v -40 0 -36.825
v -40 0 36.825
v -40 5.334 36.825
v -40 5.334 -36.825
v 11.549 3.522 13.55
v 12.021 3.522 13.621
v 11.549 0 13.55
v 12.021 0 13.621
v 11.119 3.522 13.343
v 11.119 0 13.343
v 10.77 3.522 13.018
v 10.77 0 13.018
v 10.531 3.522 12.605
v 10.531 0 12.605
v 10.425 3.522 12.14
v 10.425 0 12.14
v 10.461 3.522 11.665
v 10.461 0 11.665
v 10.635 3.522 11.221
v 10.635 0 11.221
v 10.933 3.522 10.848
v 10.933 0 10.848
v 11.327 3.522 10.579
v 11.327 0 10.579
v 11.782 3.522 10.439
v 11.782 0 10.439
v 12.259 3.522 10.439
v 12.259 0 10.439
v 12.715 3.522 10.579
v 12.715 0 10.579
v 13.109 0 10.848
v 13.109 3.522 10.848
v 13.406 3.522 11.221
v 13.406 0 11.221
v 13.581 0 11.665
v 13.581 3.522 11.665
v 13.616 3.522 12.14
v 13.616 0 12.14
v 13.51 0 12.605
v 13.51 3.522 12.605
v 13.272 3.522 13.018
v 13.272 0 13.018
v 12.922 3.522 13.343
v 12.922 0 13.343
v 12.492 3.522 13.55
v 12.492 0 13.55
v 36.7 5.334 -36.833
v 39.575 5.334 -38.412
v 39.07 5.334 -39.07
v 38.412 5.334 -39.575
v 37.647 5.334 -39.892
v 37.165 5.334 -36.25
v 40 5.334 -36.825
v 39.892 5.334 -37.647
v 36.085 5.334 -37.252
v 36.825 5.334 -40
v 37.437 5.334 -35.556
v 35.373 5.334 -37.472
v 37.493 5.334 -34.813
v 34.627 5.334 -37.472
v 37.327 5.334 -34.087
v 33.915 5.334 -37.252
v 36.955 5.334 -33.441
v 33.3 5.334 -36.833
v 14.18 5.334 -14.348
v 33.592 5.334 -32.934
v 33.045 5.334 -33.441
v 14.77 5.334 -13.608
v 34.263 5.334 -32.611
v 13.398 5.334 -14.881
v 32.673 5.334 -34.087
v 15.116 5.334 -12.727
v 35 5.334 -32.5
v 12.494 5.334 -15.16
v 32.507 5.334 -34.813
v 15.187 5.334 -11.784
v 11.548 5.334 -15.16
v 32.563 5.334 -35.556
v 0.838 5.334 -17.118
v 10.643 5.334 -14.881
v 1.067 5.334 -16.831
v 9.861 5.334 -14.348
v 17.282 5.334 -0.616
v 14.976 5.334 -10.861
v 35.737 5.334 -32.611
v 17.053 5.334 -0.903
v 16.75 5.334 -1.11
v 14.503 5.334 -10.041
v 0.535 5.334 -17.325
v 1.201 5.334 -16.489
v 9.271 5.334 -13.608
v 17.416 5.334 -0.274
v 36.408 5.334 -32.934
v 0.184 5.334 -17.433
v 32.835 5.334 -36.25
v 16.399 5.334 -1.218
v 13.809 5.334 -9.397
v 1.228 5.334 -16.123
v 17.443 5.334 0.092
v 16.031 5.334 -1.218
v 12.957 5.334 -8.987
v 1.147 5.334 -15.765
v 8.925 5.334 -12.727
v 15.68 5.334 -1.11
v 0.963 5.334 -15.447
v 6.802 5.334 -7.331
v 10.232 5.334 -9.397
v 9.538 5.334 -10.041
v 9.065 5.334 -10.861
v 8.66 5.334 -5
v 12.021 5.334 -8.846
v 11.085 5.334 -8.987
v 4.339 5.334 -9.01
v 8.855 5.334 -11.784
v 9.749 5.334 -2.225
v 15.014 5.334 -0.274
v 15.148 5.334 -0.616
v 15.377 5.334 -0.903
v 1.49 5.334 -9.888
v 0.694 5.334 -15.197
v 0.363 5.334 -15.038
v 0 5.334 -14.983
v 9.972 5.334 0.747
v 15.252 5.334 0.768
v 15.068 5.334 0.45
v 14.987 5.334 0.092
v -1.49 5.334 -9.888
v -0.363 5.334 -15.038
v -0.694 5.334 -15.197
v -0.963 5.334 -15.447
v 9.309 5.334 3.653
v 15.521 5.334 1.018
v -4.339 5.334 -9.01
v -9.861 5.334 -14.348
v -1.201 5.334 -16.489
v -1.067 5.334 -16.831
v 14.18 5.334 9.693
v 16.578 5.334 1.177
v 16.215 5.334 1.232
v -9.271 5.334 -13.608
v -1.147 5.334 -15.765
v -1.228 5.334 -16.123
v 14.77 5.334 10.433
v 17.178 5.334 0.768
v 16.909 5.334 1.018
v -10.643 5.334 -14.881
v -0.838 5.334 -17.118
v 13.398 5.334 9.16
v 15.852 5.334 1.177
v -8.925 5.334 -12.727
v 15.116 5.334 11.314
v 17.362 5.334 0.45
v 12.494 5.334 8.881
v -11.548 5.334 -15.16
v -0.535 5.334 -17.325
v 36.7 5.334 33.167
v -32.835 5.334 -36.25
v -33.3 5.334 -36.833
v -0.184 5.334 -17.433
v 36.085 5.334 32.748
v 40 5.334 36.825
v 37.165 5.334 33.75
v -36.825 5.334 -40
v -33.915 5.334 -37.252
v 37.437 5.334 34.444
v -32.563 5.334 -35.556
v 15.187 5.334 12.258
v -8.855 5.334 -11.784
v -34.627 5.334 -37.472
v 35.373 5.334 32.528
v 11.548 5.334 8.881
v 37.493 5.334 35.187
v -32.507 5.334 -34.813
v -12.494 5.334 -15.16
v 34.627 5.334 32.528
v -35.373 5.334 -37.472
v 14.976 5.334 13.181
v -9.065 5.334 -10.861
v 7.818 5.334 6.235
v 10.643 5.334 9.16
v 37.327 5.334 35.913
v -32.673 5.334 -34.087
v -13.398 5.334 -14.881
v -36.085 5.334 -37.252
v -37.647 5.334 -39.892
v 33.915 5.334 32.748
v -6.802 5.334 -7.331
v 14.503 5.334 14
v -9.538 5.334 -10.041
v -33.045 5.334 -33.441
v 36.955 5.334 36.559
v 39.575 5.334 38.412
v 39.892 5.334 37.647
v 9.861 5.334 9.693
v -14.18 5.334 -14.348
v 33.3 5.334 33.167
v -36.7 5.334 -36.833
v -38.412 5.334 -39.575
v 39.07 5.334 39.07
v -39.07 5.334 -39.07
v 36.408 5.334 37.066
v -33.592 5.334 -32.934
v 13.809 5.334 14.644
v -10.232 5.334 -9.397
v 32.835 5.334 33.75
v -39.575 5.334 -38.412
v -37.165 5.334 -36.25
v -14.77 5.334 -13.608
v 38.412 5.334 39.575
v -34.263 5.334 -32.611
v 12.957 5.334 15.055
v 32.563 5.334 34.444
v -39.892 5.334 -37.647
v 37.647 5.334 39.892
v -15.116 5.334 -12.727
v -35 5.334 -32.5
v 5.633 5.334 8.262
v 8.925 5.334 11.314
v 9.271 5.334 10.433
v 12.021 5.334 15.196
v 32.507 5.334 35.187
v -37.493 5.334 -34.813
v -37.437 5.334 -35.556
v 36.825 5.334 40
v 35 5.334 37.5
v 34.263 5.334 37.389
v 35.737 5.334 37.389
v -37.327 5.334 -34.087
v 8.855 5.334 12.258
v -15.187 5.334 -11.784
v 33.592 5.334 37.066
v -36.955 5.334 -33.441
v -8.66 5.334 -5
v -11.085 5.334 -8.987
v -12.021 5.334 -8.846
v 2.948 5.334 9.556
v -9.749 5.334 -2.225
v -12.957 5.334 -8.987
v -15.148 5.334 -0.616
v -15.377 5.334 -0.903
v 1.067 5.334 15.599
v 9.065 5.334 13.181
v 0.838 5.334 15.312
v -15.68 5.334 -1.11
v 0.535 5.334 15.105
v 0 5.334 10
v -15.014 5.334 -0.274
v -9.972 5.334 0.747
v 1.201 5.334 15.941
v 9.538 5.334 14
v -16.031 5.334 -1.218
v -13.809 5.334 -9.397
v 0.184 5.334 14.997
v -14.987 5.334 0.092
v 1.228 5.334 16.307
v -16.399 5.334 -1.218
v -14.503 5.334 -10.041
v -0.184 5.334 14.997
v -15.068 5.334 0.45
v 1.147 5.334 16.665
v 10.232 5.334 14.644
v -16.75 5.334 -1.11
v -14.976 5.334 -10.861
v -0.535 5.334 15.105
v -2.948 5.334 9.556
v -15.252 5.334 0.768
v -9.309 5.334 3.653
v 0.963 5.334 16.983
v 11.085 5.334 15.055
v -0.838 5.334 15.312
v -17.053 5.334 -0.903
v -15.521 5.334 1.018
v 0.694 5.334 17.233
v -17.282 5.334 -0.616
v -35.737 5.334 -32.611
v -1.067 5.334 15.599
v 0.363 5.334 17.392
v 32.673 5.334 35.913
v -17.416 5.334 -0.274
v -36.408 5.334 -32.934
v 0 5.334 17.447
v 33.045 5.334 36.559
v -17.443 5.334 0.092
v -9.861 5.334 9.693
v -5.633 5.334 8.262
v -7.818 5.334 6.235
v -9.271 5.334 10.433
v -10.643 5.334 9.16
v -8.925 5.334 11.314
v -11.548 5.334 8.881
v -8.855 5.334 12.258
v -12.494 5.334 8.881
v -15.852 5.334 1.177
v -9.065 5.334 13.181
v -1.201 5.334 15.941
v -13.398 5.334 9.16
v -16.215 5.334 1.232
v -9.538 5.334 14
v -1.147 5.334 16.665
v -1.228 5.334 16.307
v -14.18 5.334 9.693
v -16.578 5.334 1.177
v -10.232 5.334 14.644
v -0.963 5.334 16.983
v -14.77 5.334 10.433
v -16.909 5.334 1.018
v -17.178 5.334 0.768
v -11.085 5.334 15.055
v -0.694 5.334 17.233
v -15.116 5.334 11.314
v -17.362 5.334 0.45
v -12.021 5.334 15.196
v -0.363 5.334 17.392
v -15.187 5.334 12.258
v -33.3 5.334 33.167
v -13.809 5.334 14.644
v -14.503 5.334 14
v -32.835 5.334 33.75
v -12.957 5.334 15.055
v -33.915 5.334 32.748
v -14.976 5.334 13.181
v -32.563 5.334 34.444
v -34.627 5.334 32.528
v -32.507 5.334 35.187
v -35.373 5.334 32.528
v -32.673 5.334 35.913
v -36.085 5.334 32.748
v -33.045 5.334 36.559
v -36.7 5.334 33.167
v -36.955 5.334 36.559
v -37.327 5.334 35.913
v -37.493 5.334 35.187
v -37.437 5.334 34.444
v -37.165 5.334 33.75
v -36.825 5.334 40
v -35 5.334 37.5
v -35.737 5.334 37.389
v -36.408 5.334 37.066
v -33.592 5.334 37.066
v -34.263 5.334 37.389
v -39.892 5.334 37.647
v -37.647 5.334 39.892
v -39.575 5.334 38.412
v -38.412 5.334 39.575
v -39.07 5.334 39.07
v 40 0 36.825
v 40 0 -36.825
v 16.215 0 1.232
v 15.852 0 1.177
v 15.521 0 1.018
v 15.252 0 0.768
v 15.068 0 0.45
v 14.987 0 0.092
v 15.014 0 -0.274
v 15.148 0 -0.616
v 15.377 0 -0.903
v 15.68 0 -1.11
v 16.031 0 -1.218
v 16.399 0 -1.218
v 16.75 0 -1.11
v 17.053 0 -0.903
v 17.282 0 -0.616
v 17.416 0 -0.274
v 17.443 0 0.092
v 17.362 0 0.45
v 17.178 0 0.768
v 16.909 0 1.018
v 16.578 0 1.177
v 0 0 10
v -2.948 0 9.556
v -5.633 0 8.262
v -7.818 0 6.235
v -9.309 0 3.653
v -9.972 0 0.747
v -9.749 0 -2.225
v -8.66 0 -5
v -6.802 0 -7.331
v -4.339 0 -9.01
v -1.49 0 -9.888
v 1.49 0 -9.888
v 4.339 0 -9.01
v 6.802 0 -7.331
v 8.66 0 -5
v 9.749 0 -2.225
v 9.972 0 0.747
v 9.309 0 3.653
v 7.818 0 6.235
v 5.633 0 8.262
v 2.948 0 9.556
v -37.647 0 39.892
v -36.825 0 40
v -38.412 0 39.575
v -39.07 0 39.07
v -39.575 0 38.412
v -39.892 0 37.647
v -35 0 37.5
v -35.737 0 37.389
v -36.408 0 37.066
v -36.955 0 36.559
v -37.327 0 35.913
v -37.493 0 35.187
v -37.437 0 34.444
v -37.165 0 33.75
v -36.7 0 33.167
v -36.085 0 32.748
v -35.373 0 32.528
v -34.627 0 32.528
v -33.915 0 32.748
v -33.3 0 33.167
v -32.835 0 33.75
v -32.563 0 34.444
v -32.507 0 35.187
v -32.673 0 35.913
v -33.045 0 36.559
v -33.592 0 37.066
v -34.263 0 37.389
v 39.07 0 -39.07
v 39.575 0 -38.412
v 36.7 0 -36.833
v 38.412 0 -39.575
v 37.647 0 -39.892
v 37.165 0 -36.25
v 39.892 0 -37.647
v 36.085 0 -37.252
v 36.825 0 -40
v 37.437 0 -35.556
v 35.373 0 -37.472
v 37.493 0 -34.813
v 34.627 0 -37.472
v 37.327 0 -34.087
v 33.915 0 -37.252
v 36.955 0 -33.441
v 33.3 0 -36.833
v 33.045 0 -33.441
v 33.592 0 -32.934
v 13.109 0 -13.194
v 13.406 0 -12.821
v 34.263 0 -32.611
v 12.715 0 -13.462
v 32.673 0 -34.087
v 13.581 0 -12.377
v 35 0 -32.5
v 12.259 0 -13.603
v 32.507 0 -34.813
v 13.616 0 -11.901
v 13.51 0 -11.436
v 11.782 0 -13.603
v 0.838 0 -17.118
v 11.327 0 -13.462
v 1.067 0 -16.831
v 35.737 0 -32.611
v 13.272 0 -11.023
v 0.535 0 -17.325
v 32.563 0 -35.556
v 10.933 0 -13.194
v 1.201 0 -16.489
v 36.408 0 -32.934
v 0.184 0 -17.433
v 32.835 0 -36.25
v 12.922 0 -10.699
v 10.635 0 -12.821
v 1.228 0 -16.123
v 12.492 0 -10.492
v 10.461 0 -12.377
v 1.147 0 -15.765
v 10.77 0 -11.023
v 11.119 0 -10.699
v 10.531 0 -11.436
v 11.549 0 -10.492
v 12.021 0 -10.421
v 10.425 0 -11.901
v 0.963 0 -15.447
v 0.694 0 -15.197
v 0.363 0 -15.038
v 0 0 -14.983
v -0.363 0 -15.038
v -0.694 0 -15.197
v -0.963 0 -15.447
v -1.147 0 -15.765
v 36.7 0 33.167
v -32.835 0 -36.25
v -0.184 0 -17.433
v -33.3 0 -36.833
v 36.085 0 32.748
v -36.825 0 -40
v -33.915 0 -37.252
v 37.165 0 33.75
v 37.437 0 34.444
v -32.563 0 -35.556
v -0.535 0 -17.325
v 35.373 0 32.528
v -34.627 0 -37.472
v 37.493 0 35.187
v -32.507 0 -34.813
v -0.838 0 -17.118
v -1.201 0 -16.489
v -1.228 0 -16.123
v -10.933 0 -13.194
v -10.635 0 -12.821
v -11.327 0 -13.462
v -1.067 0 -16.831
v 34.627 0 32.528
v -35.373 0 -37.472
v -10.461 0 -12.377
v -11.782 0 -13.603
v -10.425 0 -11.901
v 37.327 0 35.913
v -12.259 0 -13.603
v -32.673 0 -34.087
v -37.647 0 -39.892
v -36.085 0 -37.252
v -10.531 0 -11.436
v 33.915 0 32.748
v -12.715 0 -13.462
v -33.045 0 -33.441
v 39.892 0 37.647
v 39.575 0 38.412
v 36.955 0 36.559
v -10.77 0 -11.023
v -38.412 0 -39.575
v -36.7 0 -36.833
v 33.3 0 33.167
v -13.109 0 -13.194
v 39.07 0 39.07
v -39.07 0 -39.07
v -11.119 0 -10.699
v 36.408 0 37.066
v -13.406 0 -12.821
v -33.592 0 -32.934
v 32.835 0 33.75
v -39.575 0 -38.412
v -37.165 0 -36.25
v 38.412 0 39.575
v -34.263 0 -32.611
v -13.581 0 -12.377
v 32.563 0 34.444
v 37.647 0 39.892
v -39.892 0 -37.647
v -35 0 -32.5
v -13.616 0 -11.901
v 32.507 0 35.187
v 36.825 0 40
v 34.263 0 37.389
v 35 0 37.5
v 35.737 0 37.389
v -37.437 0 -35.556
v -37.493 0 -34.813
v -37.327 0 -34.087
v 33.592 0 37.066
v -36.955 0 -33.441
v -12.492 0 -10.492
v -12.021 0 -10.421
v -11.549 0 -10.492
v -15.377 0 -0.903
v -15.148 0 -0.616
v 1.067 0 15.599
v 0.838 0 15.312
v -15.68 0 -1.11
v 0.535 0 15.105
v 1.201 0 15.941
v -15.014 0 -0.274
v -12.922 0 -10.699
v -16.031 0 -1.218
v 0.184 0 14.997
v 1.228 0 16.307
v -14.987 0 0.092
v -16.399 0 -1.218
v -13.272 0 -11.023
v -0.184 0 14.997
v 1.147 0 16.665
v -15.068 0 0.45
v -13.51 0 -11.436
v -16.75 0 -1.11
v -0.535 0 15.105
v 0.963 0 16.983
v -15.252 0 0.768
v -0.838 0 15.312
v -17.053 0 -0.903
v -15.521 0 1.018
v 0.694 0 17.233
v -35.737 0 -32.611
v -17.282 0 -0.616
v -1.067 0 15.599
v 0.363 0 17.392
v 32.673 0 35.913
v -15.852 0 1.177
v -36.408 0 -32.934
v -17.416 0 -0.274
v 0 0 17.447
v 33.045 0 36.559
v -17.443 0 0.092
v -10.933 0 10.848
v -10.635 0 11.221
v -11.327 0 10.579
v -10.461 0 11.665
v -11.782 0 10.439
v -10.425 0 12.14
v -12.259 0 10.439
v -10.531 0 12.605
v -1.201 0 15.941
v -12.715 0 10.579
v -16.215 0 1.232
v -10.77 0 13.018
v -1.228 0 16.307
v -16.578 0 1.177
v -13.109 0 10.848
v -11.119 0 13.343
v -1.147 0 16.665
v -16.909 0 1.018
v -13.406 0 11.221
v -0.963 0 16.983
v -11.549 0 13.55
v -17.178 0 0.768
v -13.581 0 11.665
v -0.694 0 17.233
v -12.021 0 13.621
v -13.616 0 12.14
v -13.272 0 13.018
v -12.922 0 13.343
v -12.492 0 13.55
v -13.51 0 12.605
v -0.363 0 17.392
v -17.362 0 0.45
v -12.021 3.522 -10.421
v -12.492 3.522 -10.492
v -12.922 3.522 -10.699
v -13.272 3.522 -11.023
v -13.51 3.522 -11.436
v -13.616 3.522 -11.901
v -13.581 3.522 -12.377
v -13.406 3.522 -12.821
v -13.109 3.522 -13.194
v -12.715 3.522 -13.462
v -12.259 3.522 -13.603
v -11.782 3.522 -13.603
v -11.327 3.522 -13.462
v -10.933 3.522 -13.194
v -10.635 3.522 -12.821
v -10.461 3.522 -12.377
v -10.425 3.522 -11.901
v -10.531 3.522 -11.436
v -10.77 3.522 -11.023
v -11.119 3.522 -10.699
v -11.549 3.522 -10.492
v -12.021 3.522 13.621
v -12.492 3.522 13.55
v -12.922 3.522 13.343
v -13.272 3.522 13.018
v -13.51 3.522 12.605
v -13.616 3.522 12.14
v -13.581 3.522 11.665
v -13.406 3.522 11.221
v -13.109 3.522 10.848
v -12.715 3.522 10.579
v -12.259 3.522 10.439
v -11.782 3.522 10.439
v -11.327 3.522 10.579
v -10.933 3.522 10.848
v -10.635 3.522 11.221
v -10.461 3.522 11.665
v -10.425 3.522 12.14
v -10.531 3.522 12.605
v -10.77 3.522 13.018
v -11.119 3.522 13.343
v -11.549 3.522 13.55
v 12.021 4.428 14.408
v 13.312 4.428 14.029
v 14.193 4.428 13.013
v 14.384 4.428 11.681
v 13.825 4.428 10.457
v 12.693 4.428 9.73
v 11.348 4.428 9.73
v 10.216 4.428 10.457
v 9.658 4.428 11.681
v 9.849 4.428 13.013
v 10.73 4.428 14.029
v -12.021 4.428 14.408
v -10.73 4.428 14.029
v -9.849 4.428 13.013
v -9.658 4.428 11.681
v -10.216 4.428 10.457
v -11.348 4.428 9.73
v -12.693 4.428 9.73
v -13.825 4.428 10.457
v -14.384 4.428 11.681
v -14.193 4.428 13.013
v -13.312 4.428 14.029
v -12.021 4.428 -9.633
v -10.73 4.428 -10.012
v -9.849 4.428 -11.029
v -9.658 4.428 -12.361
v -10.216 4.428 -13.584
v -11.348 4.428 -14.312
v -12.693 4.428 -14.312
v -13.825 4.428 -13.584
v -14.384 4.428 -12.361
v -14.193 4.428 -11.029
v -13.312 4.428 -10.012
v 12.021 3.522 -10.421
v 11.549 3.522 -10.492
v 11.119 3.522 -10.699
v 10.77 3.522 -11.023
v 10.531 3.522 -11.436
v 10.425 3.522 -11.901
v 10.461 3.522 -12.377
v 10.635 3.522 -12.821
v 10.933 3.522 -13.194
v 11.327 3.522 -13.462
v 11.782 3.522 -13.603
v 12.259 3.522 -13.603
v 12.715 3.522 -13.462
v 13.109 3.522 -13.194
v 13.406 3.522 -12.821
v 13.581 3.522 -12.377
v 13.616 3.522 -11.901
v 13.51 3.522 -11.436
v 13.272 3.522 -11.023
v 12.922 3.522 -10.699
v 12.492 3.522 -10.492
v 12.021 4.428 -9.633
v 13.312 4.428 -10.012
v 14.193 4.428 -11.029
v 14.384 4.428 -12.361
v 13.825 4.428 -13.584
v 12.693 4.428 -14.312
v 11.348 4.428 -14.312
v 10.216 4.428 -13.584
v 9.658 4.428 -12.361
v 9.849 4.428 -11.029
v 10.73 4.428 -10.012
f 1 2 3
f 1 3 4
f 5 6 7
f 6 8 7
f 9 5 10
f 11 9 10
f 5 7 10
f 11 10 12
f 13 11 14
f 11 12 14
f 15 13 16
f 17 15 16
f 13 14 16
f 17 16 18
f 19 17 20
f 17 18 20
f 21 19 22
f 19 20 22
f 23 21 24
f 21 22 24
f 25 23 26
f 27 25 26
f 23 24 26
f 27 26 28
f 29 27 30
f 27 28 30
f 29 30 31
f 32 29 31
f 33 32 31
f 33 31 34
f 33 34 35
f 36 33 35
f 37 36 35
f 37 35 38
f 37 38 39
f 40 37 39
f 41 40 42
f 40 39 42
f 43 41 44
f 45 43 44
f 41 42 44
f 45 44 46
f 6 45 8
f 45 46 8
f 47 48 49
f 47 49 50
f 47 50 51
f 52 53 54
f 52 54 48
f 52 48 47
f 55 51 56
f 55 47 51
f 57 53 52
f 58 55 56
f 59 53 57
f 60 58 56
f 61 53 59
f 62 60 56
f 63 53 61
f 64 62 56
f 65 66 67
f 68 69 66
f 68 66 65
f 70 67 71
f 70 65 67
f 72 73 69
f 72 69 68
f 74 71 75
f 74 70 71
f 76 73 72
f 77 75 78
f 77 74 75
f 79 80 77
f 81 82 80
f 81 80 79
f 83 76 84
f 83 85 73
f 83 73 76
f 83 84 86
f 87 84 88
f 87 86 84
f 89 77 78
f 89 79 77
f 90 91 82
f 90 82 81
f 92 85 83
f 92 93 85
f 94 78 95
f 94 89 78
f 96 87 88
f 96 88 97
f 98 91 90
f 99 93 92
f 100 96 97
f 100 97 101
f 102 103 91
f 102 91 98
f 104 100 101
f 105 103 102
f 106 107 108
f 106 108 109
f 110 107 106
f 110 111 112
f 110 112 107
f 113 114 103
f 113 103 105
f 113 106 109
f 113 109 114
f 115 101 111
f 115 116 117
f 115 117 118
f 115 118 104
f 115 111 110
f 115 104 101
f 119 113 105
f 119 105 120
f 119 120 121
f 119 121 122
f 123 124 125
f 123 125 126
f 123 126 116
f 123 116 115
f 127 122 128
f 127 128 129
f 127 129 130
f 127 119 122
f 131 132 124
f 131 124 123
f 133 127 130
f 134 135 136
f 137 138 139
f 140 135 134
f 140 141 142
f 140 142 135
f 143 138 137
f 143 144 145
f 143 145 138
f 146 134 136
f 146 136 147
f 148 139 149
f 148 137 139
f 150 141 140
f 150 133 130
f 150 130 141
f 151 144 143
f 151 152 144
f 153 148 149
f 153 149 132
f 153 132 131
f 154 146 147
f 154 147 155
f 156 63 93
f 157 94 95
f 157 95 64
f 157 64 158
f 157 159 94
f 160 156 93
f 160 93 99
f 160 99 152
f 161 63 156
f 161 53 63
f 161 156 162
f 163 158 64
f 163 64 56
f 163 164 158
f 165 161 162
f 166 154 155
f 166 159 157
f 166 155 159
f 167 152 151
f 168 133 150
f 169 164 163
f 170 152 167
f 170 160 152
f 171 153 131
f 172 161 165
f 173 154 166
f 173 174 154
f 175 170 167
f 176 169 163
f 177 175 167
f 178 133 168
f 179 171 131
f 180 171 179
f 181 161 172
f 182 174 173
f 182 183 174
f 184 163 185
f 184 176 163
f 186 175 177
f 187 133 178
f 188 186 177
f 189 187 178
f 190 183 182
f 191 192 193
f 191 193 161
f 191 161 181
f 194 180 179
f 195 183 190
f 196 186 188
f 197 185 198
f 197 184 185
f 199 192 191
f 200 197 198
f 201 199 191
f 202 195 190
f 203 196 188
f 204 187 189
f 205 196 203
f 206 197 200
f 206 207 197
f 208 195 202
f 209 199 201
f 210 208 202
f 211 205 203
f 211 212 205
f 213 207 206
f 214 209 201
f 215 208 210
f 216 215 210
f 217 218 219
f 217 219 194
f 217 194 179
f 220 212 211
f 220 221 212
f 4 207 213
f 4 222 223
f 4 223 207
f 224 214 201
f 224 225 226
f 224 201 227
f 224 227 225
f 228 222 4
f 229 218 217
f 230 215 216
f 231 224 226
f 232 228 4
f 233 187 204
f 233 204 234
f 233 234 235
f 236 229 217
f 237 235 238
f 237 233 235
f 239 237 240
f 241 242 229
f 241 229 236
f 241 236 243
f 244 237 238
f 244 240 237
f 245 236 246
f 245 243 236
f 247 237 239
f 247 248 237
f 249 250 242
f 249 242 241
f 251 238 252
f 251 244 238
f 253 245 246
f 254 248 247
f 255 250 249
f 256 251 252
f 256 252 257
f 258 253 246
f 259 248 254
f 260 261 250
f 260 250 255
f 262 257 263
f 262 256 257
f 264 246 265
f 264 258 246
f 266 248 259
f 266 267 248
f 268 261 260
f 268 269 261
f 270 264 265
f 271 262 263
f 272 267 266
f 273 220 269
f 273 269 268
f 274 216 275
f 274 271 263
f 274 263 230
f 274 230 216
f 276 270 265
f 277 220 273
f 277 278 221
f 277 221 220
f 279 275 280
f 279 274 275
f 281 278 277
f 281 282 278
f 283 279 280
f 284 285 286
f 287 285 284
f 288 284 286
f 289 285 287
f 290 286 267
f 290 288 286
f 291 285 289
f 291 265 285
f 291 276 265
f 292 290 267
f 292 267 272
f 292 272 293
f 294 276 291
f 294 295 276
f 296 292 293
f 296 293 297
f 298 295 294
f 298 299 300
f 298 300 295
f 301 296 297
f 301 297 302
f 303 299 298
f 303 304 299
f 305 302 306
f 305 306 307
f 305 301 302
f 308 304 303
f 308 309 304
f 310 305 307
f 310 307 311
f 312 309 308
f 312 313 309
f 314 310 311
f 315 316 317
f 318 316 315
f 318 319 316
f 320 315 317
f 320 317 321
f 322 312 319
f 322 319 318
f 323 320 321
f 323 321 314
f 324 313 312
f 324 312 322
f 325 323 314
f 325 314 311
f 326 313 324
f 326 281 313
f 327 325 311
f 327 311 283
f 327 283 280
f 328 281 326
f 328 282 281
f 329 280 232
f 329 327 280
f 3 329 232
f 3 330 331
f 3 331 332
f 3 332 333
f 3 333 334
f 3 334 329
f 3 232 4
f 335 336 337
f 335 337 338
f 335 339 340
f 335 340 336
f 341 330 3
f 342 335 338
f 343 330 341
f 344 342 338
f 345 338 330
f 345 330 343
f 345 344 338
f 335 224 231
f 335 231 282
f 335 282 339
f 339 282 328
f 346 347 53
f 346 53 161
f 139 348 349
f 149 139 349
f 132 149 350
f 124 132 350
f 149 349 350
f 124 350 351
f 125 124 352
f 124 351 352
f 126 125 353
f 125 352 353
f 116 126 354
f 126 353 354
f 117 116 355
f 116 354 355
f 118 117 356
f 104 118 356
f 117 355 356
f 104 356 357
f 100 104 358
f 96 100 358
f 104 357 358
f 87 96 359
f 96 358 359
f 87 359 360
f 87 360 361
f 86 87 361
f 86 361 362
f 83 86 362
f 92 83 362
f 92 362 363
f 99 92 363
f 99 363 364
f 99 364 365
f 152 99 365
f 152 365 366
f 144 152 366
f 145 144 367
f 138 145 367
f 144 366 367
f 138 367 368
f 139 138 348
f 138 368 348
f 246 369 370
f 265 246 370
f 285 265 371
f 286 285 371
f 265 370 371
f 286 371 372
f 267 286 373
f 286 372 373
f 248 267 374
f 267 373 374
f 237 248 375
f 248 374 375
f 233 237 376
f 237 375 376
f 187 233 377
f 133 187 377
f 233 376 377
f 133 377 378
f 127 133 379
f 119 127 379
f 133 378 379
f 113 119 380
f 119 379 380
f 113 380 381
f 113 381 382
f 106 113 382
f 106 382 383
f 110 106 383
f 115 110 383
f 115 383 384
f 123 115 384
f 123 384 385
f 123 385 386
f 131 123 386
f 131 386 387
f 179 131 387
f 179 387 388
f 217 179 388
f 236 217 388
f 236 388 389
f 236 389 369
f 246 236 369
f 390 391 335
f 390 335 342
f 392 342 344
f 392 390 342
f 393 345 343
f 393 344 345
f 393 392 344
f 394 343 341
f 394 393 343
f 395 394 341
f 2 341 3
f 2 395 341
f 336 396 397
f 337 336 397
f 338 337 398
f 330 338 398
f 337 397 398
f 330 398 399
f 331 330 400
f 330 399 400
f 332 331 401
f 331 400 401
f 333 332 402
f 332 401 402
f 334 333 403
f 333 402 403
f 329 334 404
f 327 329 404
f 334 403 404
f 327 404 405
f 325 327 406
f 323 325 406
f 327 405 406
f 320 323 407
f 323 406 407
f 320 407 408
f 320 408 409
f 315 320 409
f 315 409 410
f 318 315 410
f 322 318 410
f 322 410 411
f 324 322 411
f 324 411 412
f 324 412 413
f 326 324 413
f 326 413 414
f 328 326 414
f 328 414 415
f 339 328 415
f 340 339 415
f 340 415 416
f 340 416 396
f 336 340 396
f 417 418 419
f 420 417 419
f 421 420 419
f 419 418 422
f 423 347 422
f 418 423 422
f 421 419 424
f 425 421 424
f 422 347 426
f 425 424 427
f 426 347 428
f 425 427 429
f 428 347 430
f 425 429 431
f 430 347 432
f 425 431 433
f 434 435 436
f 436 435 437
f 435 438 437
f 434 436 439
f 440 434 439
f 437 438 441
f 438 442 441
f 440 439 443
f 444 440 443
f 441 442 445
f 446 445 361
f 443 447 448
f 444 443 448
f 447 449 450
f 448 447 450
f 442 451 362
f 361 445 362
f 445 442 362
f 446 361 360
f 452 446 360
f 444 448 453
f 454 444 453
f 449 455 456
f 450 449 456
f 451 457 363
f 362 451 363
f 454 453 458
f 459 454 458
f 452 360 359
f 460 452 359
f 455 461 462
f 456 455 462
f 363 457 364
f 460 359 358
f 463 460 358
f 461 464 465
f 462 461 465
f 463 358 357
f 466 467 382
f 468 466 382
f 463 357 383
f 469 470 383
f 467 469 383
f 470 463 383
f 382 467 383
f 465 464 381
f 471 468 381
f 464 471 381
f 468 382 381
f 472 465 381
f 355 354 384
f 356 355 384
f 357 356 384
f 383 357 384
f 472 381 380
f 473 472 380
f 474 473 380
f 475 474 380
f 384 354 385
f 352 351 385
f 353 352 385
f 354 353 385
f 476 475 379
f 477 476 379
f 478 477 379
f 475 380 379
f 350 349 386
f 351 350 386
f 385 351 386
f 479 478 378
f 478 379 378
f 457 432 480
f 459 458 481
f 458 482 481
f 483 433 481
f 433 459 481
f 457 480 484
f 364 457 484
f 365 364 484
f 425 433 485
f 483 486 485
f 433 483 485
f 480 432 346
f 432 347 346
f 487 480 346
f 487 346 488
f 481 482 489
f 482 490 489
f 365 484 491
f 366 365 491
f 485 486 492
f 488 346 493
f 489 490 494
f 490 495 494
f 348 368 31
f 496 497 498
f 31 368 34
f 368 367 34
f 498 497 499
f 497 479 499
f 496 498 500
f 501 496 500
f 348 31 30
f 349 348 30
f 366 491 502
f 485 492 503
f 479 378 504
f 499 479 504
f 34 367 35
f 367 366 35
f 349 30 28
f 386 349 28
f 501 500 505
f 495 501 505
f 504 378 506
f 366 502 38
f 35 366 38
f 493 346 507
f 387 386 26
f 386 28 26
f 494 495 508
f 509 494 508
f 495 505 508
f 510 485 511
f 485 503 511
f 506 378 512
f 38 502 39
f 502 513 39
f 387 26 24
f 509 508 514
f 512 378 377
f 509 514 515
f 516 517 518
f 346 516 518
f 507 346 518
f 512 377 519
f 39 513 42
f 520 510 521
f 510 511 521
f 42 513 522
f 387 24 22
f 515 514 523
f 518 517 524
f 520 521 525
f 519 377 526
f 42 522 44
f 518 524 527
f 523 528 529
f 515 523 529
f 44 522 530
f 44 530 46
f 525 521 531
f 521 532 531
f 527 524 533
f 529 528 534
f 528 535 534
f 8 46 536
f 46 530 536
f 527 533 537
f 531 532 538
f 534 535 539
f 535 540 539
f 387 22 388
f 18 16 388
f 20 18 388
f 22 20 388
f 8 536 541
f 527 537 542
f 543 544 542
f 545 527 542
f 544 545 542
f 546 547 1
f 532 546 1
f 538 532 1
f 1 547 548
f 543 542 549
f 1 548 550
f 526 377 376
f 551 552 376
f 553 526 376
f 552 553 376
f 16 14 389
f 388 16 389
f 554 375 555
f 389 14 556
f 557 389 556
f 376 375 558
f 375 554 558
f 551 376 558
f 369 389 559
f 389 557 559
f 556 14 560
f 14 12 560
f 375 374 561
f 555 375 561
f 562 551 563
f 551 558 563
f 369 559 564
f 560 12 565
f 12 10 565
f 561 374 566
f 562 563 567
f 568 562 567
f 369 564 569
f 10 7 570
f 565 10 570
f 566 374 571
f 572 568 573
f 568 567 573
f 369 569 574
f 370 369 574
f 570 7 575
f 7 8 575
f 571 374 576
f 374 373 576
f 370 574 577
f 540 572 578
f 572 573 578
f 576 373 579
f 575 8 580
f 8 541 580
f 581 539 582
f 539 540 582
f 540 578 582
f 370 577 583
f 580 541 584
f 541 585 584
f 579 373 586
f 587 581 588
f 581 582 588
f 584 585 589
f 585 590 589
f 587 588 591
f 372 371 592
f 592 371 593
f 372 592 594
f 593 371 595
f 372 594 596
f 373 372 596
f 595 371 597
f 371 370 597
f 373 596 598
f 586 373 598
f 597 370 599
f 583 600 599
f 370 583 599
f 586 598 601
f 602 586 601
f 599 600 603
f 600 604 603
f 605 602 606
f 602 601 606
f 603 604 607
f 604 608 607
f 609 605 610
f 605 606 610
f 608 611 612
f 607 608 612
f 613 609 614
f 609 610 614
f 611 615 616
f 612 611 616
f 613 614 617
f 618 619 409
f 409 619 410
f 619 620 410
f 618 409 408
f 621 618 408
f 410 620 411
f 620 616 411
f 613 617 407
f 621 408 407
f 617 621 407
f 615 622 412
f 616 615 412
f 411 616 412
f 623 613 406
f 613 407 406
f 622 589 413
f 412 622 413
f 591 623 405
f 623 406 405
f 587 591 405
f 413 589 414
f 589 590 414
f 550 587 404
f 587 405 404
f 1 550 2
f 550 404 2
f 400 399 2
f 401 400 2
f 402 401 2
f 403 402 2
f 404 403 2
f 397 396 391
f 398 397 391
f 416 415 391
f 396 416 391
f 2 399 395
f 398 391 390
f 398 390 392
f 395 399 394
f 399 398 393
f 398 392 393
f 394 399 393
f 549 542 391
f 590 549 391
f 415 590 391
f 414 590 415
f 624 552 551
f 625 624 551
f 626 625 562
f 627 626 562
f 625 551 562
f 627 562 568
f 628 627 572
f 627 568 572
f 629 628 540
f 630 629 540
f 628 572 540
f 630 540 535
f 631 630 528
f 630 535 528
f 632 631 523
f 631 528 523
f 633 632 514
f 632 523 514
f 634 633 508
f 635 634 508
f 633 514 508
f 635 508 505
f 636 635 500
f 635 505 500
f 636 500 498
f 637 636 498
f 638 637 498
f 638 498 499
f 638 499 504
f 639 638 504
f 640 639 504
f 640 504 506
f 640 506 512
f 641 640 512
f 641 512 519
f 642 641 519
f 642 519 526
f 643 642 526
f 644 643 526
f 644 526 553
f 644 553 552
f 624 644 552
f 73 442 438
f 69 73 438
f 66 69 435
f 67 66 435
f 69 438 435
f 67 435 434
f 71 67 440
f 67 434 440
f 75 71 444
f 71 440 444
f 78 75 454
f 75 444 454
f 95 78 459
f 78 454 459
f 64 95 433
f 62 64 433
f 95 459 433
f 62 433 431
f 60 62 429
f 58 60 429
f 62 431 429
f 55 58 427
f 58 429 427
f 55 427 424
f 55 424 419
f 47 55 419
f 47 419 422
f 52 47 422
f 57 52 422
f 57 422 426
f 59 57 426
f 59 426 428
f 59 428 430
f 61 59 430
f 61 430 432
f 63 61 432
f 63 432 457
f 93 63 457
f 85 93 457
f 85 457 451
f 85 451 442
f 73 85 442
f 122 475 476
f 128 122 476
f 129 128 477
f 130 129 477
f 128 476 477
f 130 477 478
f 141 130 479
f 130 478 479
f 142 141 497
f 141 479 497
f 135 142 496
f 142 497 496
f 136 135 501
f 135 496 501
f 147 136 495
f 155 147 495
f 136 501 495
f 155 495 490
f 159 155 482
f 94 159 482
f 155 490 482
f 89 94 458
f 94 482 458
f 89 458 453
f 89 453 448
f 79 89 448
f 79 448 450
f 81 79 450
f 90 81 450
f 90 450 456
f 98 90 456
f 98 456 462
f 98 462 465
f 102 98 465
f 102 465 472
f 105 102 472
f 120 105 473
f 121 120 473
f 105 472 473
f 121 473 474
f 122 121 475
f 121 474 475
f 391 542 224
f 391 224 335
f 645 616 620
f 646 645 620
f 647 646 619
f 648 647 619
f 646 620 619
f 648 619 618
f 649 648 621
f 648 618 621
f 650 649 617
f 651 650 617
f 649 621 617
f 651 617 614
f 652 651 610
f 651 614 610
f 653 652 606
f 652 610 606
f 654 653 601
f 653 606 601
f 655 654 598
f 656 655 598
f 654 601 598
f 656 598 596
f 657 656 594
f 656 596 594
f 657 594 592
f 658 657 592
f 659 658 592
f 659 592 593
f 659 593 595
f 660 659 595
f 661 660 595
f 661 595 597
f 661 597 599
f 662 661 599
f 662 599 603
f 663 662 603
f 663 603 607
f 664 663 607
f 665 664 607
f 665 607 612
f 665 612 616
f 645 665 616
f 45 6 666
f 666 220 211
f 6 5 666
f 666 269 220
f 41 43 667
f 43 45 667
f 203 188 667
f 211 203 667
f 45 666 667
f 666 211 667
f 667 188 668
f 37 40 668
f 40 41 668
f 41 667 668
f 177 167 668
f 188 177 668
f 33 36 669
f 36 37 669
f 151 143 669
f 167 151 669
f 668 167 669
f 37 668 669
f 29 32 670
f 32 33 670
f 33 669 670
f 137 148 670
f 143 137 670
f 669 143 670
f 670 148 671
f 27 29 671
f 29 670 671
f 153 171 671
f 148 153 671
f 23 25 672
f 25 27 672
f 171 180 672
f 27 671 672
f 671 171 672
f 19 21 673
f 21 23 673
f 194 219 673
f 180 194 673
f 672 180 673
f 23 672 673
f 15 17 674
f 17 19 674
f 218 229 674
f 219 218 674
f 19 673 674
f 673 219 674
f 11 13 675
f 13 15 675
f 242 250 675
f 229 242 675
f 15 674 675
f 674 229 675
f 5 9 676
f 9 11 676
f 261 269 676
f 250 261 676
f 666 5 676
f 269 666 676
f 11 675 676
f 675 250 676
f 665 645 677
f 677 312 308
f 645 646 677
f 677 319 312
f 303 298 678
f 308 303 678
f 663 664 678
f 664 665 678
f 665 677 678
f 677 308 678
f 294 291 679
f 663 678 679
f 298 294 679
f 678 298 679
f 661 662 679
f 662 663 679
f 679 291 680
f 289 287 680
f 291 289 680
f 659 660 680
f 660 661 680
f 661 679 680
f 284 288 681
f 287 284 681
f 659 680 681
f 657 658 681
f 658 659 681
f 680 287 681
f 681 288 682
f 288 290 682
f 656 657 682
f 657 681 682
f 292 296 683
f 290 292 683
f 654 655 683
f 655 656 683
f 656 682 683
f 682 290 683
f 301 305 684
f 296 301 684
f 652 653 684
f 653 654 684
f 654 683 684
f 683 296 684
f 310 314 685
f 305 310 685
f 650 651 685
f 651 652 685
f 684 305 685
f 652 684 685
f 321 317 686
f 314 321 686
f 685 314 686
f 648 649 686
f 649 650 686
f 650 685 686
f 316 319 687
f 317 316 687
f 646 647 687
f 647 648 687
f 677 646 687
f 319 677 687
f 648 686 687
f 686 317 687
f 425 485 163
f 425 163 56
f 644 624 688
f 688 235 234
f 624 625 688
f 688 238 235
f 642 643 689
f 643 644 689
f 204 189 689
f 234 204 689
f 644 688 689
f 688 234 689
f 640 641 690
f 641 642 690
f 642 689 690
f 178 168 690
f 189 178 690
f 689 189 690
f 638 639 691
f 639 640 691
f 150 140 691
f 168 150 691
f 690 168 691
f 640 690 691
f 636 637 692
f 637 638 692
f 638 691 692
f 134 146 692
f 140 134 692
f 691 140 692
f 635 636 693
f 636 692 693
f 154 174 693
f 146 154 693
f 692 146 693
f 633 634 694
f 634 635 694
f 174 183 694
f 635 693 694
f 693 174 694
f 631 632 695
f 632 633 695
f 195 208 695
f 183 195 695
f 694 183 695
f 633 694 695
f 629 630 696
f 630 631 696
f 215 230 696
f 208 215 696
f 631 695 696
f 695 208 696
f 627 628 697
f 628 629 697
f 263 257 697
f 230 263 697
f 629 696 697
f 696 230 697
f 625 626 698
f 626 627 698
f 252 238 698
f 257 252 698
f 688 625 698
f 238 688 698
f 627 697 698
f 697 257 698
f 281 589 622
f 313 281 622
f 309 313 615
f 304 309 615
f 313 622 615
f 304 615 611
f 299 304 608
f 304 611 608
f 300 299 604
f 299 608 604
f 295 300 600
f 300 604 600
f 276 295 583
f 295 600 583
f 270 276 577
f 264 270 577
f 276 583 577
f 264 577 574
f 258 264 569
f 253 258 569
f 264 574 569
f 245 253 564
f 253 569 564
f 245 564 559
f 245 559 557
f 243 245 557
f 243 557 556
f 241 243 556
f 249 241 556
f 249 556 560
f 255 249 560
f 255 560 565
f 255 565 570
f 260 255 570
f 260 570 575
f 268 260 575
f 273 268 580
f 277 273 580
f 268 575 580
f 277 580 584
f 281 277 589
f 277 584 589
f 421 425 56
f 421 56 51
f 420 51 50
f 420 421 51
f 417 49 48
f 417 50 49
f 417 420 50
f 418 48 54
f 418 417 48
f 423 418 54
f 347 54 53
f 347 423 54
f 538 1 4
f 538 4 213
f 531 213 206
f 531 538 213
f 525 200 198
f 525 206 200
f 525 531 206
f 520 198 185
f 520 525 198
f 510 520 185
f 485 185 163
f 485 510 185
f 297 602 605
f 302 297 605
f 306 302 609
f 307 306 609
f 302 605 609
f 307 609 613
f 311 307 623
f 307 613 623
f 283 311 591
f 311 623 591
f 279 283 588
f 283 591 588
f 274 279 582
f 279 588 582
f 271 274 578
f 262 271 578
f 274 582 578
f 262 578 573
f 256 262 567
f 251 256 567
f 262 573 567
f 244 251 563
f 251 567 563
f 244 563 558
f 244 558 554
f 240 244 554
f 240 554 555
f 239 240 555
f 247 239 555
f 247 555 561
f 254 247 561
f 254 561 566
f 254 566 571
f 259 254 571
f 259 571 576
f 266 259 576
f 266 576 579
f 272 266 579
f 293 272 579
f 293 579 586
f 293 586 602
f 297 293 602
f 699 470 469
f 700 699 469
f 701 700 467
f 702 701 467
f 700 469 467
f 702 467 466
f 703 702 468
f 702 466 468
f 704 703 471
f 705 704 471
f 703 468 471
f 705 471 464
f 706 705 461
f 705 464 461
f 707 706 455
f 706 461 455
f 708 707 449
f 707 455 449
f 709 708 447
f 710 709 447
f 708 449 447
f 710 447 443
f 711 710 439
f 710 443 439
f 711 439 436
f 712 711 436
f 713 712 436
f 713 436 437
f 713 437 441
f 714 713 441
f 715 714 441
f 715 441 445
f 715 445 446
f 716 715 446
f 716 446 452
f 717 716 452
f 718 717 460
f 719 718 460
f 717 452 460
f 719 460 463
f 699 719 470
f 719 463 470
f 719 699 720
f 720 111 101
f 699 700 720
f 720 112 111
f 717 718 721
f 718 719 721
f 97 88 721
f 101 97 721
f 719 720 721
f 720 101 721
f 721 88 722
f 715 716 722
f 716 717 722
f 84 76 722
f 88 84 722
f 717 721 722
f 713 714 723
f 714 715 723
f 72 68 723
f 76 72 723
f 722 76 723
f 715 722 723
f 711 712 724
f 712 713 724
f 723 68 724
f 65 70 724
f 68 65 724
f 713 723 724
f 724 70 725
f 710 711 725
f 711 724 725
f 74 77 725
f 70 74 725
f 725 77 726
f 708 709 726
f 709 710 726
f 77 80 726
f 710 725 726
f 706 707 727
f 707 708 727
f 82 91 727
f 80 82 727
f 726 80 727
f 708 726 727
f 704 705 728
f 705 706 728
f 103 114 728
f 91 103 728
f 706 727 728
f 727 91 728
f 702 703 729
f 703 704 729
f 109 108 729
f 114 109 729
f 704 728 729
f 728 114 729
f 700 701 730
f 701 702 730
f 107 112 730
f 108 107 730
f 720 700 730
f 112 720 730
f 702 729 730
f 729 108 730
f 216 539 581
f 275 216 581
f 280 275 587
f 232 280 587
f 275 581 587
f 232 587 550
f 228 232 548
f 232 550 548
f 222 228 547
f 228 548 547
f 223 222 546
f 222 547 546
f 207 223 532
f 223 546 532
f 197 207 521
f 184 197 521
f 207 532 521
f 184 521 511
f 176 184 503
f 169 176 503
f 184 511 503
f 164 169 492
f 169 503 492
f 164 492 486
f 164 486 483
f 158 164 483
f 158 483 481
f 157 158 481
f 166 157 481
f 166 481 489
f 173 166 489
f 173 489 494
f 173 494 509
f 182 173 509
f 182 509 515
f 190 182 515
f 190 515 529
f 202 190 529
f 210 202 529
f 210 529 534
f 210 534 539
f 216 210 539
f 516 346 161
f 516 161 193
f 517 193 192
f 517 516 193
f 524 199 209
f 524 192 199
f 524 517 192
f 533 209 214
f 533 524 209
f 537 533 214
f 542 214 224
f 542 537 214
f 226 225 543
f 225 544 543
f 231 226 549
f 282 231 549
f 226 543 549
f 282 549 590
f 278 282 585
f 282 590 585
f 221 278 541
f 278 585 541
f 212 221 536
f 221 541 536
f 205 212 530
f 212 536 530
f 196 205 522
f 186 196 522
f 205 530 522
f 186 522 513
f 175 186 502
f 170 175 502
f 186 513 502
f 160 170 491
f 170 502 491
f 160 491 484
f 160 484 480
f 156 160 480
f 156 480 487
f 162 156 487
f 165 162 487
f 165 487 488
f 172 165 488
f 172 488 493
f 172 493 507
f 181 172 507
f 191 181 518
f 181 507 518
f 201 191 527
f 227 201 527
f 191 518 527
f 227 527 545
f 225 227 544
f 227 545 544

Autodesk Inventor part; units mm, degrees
ref_plane "YZ Plane" through (0, 0, 0) normal (1, 0, 0) x (0, 1, 0)
ref_plane "XZ Plane" through (0, 0, 0) normal (0, 1, 0) x (-1, 0, 0)
ref_plane "XY Plane" through (0, 0, 0) normal (0, 0, 1) x (1, 0, 0)
sketch "Sketch1" plane through (0, 0, 0) normal (0, 1, 0) x (-1, 0, 0)
  line L0 (40, 36.825) -> (40, -36.825)
  line L1 (36.825, -40) -> (-36.825, -40)
  line L2 (-40, -36.825) -> (-40, 36.825)
  line L3 (-36.825, 40) -> (-13.175, 40)
  line L4 (13.175, 40) -> (36.825, 40)
  arc A0 (40, 36.825) -> (36.825, 40) centre (36.825, 36.825) ccw
  arc A1 (36.825, -40) -> (40, -36.825) centre (36.825, -36.825) ccw
  arc A2 (-40, -36.825) -> (-36.825, -40) centre (-36.825, -36.825) ccw
  arc A3 (-36.825, 40) -> (-40, 36.825) centre (-36.825, 36.825) ccw
  line L5 (13.175, 40) -> (-13.175, 40)
  point P0 (0, 0)
  point P1 (40, 40)
  point P2 (40, -40)
  point P3 (-40, -40)
  point P4 (-40, 40)
  point P5 (-10, 40)
  point P6 (10, 40)
  point P7 (40, 0)
  point P8 (0, -40)
  point P9 (0, 60)
  dimension "d0" = 80
  dimension "d1" = 80
  dimension "d27" = 3.175
extrude "Extrusion1" add sketch "Sketch1" along normal blind 5.334
sketch "Sketch2" plane through (0, 5.334, 0) normal (0, 1, 0) x (1, 0, 0)
  line L0 (-12.0208, -12.0208) -> (0, 0)
  line L1 (0, 0) -> (-40, 0)
  line L2 (-40, 36.825) -> (-40, -36.825) projected
  point P0 (-17.5, 17.5)
  point P1 (-17.5, -17.5)
  point P2 (12.0208, -12.0208)
  point P3 (12.0208, 12.0208)
  point P4 (-12.0208, 12.0208)
  dimension "d6" = 17
  dimension "d7" = 45
  dimension "d10" = 360
hole "Hole1" at (-12.0208, 5.334, 12.0208) at (12.0208, 5.334, 12.0208) at (12.0208, 5.334, -12.0208) at (-12.0208, 5.334, -12.0208) direction (0, -1, 0) diameter 3.2 end through all countersink diameter 6.35 countersink angle 82
sketch "Sketch3" plane through (0, 5.334, 0) normal (0, 1, 0) x (1, 0, 0)
  point P0 (0, 0)
  point P1 (0, 0)
hole "Hole2" at (0, 5.334, 0) direction (0, -1, 0) diameter 20 end through all
sketch "Sketch4" plane through (0, 5.334, 0) normal (0, 1, 0) x (1, 0, 0)
  point P0 (0, 0)
  point P1 (-16.215, 0)
  point P2 (0, -16.215)
  point P3 (16.215, 0)
  point P4 (0, 16.215)
  dimension "d29" = 16.215
  dimension "d47" = 360
hole "Hole3" at (-16.215, 5.334, 0) at (0, 5.334, 16.215) at (16.215, 5.334, 0) at (0, 5.334, -16.215) direction (0, -1, 0) diameter 2.4638 end through all
sketch "Sketch7" plane through (0, 5.334, 0) normal (0, 1, 0) x (1, 0, 0)
  line L0 (-40, 36.825) -> (-40, -36.825) projected
  line L1 (36.825, 40) -> (-36.825, 40) projected
  line L2 (-36.825, -40) -> (36.825, -40) projected
  line L3 (40, -36.825) -> (40, 36.825) projected
  point P0 (0, 0)
  point P1 (-35, 35)
  point P2 (35, 35)
  point P3 (35, -35)
  point P4 (-35, -35)
  dimension "d49" = 5
  dimension "d50" = 5
  dimension "d51" = 5
  dimension "d52" = 5
hole "Hole4" at (-35, 5.334, -35) at (35, 5.334, -35) at (35, 5.334, 35) at (-35, 5.334, 35) direction (0, -1, 0) diameter 5 end through all
equation "\"d50\" = d49"
equation "\"d51\" = d49"
equation "\"d52\" = d49"
properties part number "base_mount"
